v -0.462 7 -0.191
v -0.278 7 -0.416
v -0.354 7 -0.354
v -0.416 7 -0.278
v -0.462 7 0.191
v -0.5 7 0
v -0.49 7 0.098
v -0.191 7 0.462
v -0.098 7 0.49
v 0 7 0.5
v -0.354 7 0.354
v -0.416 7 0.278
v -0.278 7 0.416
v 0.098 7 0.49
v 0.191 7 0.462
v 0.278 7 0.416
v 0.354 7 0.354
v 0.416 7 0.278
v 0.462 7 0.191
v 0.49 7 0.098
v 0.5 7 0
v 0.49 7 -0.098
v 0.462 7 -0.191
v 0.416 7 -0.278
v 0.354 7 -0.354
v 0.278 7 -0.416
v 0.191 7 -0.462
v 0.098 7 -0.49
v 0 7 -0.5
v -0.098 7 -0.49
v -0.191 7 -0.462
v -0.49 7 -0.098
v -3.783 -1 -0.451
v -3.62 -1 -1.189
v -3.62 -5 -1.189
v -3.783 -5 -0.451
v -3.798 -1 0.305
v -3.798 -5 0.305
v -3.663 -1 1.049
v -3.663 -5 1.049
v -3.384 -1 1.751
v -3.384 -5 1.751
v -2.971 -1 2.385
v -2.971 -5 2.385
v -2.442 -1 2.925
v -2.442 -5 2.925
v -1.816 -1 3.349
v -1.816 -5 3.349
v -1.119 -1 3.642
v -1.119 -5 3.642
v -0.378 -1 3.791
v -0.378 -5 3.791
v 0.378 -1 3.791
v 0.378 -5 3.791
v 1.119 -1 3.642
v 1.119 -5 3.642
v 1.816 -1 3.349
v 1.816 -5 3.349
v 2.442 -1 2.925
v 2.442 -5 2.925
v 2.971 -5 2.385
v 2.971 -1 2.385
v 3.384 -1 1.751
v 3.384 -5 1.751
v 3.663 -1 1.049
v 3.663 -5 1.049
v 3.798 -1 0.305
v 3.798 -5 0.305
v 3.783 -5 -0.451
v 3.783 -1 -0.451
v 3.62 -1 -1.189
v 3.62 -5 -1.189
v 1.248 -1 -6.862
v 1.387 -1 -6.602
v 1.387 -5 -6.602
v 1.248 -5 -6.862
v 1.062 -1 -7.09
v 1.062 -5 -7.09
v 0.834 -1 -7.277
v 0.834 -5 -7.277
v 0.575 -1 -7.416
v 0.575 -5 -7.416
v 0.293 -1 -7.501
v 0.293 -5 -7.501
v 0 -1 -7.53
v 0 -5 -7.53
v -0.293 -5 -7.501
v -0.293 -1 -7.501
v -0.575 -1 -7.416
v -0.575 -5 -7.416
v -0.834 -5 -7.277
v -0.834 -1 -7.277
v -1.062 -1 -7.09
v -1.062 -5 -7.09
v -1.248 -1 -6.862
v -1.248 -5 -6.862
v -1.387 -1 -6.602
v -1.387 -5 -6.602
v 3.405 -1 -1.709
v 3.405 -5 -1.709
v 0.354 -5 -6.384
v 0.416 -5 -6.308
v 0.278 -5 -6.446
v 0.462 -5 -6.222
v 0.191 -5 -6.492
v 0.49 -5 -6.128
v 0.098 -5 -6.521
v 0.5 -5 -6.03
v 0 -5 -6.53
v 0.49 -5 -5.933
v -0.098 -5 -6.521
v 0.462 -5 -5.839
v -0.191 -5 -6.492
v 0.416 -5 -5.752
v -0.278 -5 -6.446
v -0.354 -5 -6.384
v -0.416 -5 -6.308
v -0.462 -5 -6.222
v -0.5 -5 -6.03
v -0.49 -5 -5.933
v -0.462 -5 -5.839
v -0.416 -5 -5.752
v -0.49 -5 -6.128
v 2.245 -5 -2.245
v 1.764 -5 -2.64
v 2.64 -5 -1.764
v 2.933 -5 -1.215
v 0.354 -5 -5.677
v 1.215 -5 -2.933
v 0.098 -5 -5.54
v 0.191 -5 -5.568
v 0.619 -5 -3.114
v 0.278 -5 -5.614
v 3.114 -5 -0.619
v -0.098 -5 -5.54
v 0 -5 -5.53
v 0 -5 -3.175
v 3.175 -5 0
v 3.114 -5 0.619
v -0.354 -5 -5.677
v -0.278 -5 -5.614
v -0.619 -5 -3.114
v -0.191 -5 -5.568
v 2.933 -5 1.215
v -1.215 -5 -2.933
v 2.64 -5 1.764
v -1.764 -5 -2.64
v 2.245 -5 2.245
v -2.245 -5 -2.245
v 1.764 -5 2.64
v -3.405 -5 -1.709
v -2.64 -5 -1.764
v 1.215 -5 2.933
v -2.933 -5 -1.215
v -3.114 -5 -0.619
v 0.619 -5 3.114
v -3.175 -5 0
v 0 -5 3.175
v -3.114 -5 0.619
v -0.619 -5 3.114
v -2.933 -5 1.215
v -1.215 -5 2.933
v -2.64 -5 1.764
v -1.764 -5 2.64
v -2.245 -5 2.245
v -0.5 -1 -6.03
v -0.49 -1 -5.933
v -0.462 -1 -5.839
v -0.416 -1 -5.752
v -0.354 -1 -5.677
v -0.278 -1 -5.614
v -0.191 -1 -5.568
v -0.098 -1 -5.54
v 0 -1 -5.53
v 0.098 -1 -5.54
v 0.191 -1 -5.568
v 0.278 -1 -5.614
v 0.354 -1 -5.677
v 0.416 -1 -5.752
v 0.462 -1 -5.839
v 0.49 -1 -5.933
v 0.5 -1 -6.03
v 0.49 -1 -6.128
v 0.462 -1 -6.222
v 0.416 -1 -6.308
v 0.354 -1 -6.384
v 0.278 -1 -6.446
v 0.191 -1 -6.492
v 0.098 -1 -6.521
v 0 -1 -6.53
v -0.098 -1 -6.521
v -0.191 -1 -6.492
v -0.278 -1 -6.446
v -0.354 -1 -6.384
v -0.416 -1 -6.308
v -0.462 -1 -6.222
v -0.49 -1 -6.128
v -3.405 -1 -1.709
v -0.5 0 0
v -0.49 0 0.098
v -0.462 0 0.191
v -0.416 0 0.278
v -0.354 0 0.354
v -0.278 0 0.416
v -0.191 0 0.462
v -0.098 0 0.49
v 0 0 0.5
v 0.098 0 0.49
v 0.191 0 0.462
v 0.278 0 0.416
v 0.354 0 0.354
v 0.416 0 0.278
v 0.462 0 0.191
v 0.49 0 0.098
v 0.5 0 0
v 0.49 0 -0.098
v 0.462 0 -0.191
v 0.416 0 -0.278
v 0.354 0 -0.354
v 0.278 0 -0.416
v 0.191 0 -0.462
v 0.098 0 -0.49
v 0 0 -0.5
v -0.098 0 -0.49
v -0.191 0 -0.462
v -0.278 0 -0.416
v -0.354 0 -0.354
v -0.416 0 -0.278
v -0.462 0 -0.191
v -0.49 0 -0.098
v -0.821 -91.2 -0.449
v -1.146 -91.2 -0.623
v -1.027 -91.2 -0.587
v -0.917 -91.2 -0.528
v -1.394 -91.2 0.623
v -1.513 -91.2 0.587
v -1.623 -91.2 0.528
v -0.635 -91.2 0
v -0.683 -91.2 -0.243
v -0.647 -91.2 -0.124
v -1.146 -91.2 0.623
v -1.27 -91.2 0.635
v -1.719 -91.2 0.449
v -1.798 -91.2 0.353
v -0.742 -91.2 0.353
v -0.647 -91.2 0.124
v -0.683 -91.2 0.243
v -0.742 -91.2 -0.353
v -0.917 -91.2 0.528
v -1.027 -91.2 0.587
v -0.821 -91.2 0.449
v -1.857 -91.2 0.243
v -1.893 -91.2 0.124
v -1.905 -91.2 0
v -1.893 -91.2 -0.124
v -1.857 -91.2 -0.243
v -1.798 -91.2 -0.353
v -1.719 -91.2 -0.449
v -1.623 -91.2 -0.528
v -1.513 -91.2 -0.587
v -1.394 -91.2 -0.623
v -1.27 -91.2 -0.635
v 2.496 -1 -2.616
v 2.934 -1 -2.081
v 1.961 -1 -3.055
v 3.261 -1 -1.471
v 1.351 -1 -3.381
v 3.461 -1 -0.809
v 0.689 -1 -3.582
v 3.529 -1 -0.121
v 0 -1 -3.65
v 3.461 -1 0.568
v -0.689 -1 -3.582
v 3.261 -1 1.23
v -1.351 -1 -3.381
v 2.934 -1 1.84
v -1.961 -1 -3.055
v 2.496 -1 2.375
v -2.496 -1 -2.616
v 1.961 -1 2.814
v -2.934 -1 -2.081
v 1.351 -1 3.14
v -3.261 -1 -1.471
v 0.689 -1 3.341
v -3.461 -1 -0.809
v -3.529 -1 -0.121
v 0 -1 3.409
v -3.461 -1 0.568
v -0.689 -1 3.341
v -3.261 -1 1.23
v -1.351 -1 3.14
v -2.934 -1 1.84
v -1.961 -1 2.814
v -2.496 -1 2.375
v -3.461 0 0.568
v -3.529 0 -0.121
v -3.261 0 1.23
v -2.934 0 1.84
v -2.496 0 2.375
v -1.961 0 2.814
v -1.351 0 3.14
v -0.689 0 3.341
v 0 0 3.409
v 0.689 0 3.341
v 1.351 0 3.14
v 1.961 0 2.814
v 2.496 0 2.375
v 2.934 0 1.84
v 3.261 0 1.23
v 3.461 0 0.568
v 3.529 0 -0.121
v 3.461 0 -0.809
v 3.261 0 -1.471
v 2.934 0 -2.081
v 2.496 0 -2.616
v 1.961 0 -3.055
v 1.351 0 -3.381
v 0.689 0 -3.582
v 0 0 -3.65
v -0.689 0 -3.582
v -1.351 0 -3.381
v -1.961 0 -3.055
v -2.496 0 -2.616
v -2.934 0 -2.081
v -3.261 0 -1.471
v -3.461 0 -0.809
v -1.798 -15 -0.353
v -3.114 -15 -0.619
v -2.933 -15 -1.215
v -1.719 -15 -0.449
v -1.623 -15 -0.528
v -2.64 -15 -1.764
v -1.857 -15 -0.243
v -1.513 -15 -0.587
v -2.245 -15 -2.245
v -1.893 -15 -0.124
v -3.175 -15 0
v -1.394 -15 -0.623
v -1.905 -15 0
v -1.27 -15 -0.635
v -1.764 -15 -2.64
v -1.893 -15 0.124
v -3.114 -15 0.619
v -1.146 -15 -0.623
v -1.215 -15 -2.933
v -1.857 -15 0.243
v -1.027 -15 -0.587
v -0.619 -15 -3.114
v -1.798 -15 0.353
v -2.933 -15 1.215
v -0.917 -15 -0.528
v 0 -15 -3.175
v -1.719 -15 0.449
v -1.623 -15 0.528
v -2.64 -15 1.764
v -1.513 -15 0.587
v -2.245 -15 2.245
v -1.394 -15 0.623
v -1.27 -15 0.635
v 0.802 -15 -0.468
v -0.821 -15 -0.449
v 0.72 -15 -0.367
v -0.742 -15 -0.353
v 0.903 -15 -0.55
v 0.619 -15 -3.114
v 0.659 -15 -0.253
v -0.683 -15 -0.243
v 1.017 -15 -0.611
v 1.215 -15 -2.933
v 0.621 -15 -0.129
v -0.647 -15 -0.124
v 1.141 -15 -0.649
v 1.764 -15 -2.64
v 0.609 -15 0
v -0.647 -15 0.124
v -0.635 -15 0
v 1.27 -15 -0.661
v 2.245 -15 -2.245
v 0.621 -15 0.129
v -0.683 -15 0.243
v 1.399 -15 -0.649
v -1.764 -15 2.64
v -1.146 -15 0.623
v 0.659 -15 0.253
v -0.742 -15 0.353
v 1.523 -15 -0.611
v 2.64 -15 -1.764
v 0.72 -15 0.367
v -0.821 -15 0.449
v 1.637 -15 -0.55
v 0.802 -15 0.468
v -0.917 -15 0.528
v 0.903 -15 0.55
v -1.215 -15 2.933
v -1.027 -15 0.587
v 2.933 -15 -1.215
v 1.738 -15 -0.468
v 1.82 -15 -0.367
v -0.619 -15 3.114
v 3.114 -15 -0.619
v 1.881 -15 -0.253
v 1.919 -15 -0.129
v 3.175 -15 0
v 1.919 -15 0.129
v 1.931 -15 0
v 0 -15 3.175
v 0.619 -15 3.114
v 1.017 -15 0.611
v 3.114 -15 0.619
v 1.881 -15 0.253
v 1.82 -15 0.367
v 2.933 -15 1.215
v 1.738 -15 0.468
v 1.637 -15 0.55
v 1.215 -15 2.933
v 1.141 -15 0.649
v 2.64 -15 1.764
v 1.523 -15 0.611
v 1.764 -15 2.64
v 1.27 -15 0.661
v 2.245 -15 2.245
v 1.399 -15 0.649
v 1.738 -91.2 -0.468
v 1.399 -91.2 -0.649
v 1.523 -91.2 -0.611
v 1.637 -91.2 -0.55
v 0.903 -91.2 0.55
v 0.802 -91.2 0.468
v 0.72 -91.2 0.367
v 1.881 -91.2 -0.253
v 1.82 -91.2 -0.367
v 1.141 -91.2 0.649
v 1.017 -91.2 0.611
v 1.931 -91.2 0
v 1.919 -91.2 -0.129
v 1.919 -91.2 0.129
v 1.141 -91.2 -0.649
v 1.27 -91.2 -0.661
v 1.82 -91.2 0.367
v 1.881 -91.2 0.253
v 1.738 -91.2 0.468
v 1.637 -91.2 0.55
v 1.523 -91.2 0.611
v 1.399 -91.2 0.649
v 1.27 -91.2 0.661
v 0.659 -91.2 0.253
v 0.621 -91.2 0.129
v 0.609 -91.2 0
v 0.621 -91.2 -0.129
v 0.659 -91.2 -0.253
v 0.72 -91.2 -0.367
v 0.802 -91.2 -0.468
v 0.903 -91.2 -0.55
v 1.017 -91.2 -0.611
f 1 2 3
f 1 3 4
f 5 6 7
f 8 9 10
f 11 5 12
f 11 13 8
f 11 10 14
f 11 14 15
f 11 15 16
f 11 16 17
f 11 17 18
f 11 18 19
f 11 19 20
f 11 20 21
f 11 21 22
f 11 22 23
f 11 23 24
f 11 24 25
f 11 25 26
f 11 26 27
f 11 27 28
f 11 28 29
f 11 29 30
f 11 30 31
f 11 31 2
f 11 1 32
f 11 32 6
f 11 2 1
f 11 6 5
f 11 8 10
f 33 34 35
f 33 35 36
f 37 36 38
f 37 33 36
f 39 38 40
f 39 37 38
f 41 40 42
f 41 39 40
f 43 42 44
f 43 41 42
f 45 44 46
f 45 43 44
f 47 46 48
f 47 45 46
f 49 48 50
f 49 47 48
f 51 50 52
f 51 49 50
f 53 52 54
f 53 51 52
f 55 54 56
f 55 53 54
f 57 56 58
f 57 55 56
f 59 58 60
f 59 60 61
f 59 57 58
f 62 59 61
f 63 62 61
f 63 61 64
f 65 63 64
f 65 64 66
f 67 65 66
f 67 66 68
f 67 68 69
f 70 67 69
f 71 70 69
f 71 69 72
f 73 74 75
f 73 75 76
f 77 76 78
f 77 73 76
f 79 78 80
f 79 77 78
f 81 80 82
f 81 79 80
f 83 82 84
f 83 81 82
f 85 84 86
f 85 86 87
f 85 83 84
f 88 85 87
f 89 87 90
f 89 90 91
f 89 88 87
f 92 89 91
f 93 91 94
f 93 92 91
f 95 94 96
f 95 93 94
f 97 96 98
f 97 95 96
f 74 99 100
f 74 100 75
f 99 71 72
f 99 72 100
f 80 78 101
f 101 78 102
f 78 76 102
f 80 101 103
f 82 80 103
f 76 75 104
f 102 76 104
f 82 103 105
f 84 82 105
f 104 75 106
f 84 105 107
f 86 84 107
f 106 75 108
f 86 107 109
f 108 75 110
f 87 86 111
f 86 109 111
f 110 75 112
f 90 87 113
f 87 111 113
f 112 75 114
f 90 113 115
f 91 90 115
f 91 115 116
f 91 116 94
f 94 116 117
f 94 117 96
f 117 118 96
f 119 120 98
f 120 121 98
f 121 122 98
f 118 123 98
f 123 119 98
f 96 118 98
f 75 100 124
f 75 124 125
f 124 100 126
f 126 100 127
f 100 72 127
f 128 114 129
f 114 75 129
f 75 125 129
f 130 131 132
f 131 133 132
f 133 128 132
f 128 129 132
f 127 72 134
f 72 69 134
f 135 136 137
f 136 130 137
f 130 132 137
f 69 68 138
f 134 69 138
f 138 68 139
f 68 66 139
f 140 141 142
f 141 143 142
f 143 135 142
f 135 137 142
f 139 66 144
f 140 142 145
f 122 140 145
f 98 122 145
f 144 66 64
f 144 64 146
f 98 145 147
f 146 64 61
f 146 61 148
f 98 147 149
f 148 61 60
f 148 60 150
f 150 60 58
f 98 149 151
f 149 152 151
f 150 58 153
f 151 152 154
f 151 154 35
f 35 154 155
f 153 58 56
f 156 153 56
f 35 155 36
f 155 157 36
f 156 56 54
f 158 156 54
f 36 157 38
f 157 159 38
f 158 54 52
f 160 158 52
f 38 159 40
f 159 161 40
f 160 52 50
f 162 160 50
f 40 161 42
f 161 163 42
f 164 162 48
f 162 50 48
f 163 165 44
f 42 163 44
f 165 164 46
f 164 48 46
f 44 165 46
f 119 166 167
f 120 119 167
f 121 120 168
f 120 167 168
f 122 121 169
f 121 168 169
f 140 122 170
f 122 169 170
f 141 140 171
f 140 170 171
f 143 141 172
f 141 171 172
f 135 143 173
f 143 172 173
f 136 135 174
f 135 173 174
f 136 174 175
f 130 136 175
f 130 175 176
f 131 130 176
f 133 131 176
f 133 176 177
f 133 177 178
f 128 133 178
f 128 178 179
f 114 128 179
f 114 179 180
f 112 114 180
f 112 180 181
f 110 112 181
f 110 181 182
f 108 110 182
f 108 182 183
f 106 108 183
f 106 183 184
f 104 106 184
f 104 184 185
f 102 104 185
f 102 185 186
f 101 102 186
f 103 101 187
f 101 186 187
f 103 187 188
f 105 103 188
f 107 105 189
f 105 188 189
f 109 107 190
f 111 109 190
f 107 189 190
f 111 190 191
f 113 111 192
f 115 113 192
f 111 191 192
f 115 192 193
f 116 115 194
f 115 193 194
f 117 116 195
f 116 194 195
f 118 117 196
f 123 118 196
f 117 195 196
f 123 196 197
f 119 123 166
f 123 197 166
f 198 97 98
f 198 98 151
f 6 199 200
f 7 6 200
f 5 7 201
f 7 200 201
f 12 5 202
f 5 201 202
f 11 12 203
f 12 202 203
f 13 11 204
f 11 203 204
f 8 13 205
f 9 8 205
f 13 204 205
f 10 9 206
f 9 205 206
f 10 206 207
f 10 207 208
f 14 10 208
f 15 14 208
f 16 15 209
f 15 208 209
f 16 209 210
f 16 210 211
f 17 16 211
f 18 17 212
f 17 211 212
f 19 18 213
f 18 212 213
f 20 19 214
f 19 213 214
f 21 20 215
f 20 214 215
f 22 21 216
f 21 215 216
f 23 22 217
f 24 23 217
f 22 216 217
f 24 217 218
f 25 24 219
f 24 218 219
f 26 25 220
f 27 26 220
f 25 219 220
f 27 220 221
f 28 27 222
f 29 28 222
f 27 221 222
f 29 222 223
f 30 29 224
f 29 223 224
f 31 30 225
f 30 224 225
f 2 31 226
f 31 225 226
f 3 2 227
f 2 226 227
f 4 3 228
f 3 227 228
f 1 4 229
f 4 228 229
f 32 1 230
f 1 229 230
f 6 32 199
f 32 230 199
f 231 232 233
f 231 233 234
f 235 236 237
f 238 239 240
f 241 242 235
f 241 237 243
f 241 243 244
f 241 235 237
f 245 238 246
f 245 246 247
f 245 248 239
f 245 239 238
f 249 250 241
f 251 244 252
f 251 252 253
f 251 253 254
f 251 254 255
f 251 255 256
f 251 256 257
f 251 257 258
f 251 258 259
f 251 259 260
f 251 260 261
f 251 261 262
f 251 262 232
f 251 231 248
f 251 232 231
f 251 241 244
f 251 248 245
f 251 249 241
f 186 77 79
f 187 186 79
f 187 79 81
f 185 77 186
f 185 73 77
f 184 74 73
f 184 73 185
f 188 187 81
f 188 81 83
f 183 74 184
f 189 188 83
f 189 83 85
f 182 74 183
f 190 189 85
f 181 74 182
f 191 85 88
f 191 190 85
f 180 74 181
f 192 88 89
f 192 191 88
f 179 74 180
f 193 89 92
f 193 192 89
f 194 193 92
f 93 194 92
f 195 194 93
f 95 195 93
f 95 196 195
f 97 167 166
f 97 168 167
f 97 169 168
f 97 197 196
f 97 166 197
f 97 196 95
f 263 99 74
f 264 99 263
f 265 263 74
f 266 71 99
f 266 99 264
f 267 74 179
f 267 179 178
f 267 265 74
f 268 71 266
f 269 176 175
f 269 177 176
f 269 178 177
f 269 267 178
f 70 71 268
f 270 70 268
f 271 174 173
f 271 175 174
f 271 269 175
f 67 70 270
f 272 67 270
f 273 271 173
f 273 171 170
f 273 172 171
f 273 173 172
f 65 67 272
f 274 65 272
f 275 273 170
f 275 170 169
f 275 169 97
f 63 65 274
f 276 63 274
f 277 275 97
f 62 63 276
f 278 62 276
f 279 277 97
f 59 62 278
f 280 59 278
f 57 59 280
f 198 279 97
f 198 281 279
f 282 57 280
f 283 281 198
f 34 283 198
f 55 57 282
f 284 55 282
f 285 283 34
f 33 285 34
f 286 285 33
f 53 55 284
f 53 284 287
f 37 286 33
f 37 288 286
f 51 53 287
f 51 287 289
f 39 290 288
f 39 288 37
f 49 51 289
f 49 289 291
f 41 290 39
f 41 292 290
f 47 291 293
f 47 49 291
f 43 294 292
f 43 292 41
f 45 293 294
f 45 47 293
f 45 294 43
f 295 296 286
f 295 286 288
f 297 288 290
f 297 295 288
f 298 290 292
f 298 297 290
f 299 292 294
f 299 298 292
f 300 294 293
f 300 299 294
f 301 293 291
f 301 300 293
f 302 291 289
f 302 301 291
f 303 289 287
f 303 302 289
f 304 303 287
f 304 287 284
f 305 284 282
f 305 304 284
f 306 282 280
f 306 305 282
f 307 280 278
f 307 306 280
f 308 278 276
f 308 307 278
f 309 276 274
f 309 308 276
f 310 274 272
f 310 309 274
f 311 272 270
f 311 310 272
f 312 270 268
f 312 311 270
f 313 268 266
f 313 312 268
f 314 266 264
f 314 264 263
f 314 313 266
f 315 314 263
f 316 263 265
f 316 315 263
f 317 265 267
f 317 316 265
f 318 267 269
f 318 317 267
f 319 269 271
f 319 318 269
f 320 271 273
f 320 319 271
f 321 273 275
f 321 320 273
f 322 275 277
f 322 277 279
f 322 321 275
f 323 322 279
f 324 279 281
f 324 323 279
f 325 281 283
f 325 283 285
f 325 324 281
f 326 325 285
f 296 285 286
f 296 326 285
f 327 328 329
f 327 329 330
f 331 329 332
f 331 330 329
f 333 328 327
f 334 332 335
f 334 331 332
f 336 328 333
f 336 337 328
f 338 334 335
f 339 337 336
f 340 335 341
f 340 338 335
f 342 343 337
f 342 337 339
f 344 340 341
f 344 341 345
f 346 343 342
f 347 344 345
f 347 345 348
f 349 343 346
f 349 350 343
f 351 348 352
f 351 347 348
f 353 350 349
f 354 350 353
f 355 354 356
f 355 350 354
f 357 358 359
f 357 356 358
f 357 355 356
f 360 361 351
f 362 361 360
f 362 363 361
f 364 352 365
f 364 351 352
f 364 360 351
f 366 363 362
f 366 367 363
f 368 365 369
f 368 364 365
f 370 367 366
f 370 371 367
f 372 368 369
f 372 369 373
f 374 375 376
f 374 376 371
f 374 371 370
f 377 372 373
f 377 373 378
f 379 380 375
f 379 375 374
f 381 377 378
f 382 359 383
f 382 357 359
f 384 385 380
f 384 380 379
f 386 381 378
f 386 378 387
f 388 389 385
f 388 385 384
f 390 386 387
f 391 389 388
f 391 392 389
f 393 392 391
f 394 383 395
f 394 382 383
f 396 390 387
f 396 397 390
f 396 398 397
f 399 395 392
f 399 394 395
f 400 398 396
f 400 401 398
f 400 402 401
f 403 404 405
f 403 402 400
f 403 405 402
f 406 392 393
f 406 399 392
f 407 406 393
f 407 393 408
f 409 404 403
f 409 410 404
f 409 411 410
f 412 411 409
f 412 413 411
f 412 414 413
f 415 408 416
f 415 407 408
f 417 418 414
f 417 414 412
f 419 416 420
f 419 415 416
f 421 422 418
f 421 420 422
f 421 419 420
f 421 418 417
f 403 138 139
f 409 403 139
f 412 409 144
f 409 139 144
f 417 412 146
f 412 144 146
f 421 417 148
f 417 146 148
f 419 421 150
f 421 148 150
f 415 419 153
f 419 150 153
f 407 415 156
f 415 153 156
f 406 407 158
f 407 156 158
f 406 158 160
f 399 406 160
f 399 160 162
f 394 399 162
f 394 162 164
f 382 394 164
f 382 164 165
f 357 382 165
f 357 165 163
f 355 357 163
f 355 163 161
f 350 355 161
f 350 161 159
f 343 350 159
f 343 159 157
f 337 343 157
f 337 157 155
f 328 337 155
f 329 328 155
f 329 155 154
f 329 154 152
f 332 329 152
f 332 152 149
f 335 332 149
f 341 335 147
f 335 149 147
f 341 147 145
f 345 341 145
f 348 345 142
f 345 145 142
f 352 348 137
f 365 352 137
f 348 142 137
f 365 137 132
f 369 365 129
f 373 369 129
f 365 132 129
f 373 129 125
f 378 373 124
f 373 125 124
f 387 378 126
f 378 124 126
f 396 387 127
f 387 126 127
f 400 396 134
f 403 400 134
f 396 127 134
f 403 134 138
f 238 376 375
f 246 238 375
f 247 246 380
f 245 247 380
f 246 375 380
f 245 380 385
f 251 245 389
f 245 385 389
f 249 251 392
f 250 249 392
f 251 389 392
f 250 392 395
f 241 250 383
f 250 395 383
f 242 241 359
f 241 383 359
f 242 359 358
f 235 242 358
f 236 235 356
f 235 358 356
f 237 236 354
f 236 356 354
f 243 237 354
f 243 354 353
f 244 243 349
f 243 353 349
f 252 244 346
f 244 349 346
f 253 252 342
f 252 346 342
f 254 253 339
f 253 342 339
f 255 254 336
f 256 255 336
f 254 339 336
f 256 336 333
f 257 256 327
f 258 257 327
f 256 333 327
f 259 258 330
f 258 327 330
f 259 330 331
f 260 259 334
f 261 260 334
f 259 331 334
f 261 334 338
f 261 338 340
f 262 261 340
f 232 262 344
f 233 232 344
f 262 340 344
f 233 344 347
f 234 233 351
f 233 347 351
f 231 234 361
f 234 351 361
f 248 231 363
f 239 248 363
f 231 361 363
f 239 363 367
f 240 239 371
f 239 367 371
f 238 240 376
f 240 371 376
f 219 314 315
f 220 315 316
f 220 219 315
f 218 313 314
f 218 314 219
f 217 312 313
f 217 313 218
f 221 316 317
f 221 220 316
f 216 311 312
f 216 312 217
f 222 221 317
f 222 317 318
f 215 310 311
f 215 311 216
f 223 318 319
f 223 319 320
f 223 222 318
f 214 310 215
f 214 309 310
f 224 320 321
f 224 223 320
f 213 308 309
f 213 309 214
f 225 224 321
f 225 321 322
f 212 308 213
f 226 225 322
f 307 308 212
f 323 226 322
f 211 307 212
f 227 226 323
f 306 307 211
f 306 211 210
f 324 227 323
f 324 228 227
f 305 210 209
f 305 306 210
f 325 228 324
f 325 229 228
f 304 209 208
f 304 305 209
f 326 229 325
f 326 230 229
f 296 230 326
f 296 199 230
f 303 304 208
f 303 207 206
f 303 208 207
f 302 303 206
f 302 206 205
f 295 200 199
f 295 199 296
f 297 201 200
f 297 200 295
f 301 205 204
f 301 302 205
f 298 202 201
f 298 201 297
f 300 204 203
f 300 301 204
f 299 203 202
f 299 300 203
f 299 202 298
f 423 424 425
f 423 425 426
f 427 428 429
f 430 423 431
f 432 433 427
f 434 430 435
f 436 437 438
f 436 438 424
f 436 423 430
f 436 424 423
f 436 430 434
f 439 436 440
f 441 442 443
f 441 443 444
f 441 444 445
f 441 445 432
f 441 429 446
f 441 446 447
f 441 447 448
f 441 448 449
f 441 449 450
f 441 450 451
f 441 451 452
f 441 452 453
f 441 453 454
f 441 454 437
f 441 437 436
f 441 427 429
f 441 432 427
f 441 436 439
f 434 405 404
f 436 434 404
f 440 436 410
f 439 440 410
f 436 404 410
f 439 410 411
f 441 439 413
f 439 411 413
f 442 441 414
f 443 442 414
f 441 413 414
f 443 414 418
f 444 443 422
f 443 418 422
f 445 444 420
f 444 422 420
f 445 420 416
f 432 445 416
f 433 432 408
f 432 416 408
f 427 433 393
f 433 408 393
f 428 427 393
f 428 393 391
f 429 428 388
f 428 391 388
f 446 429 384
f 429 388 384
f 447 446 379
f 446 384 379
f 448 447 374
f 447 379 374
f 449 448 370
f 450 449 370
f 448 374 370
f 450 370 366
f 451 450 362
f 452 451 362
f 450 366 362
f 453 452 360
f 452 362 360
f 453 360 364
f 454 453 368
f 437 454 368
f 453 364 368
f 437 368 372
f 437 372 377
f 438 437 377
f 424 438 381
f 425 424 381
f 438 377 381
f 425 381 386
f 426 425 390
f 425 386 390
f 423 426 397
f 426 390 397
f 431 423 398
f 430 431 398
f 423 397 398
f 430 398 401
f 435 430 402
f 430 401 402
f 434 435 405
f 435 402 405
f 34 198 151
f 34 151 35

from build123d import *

# Parameters (mm, degrees)
F0_R     = 3.175
F1_DEPTH = 15
F2_R     = 0.5
F3_DEPTH = 7
F4_R     = 0.5
F4_R_2   = 3.175
F5_DEPTH = 5
F6_R     = 9.3189524644
F6_R_2   = 3.5292713956
F7_DEPTH = 1
F8_R     = 0.635
F8_R_2   = 0.6612583991
F9_DEPTH = 76.2


with BuildPart() as f1:
    # F0 (on Front) → F1 (new body)
    with BuildSketch(Plane.XZ):
        Circle(F0_R)
    extrude(amount=F1_DEPTH)

    # F2 (on face) → F3 (join)
    with BuildSketch(Plane(origin=(0, 0, 0), x_dir=(-1, 0, 0), z_dir=(0, 1, 0))):
        Circle(F2_R)
    extrude(amount=F3_DEPTH)

    # F4 (on face) → F5 (join)
    with BuildSketch(Plane(origin=(0, 0, 0), x_dir=(-1, 0, 0), z_dir=(0, 1, 0))):
        with BuildLine():
            Line((1.3866466063, -6.6022387167), (3.4052943148, -1.7088214153))
            Line((3.4052943148, -1.7088214153), (3.6196746552, -1.1891406101))
            ThreePointArc((3.6196746552, -1.1891406101), (0, 3.81), (-3.6196746552, -1.1891406101))
            Line((-3.6196746552, -1.1891406101), (-3.4052943148, -1.7088214153))
            Line((-3.4052943148, -1.7088214153), (-1.3866466063, -6.6022387167))
            ThreePointArc((-1.3866466063, -6.6022387167), (0, -7.5302149504), (1.3866466063, -6.6022387167))
        make_face()
        with Locations((0, -6.0302149504)):
            Circle(F4_R, mode=Mode.SUBTRACT)
        Circle(F4_R_2, mode=Mode.SUBTRACT)
        Circle(F4_R_2)
        Circle(F4_R, mode=Mode.SUBTRACT)
    extrude(amount=-F5_DEPTH)

    # F6 (on face) → F7 (cut)
    with BuildSketch(Plane(origin=(0, 0, 0), x_dir=(-1, 0, 0), z_dir=(0, 1, 0))):
        Circle(F6_R)
        with Locations((0, -0.1206563757)):
            Circle(F6_R_2, mode=Mode.SUBTRACT)
    extrude(amount=-F7_DEPTH, mode=Mode.SUBTRACT)

    # F8 (on face) → F9 (join)
    with BuildSketch(Plane.XZ.offset(15)):
        with Locations((-1.27, 0)):
            Circle(F8_R)
        with Locations((1.27, 0)):
            Circle(F8_R_2)
    extrude(amount=F9_DEPTH)


solid = f1.part
